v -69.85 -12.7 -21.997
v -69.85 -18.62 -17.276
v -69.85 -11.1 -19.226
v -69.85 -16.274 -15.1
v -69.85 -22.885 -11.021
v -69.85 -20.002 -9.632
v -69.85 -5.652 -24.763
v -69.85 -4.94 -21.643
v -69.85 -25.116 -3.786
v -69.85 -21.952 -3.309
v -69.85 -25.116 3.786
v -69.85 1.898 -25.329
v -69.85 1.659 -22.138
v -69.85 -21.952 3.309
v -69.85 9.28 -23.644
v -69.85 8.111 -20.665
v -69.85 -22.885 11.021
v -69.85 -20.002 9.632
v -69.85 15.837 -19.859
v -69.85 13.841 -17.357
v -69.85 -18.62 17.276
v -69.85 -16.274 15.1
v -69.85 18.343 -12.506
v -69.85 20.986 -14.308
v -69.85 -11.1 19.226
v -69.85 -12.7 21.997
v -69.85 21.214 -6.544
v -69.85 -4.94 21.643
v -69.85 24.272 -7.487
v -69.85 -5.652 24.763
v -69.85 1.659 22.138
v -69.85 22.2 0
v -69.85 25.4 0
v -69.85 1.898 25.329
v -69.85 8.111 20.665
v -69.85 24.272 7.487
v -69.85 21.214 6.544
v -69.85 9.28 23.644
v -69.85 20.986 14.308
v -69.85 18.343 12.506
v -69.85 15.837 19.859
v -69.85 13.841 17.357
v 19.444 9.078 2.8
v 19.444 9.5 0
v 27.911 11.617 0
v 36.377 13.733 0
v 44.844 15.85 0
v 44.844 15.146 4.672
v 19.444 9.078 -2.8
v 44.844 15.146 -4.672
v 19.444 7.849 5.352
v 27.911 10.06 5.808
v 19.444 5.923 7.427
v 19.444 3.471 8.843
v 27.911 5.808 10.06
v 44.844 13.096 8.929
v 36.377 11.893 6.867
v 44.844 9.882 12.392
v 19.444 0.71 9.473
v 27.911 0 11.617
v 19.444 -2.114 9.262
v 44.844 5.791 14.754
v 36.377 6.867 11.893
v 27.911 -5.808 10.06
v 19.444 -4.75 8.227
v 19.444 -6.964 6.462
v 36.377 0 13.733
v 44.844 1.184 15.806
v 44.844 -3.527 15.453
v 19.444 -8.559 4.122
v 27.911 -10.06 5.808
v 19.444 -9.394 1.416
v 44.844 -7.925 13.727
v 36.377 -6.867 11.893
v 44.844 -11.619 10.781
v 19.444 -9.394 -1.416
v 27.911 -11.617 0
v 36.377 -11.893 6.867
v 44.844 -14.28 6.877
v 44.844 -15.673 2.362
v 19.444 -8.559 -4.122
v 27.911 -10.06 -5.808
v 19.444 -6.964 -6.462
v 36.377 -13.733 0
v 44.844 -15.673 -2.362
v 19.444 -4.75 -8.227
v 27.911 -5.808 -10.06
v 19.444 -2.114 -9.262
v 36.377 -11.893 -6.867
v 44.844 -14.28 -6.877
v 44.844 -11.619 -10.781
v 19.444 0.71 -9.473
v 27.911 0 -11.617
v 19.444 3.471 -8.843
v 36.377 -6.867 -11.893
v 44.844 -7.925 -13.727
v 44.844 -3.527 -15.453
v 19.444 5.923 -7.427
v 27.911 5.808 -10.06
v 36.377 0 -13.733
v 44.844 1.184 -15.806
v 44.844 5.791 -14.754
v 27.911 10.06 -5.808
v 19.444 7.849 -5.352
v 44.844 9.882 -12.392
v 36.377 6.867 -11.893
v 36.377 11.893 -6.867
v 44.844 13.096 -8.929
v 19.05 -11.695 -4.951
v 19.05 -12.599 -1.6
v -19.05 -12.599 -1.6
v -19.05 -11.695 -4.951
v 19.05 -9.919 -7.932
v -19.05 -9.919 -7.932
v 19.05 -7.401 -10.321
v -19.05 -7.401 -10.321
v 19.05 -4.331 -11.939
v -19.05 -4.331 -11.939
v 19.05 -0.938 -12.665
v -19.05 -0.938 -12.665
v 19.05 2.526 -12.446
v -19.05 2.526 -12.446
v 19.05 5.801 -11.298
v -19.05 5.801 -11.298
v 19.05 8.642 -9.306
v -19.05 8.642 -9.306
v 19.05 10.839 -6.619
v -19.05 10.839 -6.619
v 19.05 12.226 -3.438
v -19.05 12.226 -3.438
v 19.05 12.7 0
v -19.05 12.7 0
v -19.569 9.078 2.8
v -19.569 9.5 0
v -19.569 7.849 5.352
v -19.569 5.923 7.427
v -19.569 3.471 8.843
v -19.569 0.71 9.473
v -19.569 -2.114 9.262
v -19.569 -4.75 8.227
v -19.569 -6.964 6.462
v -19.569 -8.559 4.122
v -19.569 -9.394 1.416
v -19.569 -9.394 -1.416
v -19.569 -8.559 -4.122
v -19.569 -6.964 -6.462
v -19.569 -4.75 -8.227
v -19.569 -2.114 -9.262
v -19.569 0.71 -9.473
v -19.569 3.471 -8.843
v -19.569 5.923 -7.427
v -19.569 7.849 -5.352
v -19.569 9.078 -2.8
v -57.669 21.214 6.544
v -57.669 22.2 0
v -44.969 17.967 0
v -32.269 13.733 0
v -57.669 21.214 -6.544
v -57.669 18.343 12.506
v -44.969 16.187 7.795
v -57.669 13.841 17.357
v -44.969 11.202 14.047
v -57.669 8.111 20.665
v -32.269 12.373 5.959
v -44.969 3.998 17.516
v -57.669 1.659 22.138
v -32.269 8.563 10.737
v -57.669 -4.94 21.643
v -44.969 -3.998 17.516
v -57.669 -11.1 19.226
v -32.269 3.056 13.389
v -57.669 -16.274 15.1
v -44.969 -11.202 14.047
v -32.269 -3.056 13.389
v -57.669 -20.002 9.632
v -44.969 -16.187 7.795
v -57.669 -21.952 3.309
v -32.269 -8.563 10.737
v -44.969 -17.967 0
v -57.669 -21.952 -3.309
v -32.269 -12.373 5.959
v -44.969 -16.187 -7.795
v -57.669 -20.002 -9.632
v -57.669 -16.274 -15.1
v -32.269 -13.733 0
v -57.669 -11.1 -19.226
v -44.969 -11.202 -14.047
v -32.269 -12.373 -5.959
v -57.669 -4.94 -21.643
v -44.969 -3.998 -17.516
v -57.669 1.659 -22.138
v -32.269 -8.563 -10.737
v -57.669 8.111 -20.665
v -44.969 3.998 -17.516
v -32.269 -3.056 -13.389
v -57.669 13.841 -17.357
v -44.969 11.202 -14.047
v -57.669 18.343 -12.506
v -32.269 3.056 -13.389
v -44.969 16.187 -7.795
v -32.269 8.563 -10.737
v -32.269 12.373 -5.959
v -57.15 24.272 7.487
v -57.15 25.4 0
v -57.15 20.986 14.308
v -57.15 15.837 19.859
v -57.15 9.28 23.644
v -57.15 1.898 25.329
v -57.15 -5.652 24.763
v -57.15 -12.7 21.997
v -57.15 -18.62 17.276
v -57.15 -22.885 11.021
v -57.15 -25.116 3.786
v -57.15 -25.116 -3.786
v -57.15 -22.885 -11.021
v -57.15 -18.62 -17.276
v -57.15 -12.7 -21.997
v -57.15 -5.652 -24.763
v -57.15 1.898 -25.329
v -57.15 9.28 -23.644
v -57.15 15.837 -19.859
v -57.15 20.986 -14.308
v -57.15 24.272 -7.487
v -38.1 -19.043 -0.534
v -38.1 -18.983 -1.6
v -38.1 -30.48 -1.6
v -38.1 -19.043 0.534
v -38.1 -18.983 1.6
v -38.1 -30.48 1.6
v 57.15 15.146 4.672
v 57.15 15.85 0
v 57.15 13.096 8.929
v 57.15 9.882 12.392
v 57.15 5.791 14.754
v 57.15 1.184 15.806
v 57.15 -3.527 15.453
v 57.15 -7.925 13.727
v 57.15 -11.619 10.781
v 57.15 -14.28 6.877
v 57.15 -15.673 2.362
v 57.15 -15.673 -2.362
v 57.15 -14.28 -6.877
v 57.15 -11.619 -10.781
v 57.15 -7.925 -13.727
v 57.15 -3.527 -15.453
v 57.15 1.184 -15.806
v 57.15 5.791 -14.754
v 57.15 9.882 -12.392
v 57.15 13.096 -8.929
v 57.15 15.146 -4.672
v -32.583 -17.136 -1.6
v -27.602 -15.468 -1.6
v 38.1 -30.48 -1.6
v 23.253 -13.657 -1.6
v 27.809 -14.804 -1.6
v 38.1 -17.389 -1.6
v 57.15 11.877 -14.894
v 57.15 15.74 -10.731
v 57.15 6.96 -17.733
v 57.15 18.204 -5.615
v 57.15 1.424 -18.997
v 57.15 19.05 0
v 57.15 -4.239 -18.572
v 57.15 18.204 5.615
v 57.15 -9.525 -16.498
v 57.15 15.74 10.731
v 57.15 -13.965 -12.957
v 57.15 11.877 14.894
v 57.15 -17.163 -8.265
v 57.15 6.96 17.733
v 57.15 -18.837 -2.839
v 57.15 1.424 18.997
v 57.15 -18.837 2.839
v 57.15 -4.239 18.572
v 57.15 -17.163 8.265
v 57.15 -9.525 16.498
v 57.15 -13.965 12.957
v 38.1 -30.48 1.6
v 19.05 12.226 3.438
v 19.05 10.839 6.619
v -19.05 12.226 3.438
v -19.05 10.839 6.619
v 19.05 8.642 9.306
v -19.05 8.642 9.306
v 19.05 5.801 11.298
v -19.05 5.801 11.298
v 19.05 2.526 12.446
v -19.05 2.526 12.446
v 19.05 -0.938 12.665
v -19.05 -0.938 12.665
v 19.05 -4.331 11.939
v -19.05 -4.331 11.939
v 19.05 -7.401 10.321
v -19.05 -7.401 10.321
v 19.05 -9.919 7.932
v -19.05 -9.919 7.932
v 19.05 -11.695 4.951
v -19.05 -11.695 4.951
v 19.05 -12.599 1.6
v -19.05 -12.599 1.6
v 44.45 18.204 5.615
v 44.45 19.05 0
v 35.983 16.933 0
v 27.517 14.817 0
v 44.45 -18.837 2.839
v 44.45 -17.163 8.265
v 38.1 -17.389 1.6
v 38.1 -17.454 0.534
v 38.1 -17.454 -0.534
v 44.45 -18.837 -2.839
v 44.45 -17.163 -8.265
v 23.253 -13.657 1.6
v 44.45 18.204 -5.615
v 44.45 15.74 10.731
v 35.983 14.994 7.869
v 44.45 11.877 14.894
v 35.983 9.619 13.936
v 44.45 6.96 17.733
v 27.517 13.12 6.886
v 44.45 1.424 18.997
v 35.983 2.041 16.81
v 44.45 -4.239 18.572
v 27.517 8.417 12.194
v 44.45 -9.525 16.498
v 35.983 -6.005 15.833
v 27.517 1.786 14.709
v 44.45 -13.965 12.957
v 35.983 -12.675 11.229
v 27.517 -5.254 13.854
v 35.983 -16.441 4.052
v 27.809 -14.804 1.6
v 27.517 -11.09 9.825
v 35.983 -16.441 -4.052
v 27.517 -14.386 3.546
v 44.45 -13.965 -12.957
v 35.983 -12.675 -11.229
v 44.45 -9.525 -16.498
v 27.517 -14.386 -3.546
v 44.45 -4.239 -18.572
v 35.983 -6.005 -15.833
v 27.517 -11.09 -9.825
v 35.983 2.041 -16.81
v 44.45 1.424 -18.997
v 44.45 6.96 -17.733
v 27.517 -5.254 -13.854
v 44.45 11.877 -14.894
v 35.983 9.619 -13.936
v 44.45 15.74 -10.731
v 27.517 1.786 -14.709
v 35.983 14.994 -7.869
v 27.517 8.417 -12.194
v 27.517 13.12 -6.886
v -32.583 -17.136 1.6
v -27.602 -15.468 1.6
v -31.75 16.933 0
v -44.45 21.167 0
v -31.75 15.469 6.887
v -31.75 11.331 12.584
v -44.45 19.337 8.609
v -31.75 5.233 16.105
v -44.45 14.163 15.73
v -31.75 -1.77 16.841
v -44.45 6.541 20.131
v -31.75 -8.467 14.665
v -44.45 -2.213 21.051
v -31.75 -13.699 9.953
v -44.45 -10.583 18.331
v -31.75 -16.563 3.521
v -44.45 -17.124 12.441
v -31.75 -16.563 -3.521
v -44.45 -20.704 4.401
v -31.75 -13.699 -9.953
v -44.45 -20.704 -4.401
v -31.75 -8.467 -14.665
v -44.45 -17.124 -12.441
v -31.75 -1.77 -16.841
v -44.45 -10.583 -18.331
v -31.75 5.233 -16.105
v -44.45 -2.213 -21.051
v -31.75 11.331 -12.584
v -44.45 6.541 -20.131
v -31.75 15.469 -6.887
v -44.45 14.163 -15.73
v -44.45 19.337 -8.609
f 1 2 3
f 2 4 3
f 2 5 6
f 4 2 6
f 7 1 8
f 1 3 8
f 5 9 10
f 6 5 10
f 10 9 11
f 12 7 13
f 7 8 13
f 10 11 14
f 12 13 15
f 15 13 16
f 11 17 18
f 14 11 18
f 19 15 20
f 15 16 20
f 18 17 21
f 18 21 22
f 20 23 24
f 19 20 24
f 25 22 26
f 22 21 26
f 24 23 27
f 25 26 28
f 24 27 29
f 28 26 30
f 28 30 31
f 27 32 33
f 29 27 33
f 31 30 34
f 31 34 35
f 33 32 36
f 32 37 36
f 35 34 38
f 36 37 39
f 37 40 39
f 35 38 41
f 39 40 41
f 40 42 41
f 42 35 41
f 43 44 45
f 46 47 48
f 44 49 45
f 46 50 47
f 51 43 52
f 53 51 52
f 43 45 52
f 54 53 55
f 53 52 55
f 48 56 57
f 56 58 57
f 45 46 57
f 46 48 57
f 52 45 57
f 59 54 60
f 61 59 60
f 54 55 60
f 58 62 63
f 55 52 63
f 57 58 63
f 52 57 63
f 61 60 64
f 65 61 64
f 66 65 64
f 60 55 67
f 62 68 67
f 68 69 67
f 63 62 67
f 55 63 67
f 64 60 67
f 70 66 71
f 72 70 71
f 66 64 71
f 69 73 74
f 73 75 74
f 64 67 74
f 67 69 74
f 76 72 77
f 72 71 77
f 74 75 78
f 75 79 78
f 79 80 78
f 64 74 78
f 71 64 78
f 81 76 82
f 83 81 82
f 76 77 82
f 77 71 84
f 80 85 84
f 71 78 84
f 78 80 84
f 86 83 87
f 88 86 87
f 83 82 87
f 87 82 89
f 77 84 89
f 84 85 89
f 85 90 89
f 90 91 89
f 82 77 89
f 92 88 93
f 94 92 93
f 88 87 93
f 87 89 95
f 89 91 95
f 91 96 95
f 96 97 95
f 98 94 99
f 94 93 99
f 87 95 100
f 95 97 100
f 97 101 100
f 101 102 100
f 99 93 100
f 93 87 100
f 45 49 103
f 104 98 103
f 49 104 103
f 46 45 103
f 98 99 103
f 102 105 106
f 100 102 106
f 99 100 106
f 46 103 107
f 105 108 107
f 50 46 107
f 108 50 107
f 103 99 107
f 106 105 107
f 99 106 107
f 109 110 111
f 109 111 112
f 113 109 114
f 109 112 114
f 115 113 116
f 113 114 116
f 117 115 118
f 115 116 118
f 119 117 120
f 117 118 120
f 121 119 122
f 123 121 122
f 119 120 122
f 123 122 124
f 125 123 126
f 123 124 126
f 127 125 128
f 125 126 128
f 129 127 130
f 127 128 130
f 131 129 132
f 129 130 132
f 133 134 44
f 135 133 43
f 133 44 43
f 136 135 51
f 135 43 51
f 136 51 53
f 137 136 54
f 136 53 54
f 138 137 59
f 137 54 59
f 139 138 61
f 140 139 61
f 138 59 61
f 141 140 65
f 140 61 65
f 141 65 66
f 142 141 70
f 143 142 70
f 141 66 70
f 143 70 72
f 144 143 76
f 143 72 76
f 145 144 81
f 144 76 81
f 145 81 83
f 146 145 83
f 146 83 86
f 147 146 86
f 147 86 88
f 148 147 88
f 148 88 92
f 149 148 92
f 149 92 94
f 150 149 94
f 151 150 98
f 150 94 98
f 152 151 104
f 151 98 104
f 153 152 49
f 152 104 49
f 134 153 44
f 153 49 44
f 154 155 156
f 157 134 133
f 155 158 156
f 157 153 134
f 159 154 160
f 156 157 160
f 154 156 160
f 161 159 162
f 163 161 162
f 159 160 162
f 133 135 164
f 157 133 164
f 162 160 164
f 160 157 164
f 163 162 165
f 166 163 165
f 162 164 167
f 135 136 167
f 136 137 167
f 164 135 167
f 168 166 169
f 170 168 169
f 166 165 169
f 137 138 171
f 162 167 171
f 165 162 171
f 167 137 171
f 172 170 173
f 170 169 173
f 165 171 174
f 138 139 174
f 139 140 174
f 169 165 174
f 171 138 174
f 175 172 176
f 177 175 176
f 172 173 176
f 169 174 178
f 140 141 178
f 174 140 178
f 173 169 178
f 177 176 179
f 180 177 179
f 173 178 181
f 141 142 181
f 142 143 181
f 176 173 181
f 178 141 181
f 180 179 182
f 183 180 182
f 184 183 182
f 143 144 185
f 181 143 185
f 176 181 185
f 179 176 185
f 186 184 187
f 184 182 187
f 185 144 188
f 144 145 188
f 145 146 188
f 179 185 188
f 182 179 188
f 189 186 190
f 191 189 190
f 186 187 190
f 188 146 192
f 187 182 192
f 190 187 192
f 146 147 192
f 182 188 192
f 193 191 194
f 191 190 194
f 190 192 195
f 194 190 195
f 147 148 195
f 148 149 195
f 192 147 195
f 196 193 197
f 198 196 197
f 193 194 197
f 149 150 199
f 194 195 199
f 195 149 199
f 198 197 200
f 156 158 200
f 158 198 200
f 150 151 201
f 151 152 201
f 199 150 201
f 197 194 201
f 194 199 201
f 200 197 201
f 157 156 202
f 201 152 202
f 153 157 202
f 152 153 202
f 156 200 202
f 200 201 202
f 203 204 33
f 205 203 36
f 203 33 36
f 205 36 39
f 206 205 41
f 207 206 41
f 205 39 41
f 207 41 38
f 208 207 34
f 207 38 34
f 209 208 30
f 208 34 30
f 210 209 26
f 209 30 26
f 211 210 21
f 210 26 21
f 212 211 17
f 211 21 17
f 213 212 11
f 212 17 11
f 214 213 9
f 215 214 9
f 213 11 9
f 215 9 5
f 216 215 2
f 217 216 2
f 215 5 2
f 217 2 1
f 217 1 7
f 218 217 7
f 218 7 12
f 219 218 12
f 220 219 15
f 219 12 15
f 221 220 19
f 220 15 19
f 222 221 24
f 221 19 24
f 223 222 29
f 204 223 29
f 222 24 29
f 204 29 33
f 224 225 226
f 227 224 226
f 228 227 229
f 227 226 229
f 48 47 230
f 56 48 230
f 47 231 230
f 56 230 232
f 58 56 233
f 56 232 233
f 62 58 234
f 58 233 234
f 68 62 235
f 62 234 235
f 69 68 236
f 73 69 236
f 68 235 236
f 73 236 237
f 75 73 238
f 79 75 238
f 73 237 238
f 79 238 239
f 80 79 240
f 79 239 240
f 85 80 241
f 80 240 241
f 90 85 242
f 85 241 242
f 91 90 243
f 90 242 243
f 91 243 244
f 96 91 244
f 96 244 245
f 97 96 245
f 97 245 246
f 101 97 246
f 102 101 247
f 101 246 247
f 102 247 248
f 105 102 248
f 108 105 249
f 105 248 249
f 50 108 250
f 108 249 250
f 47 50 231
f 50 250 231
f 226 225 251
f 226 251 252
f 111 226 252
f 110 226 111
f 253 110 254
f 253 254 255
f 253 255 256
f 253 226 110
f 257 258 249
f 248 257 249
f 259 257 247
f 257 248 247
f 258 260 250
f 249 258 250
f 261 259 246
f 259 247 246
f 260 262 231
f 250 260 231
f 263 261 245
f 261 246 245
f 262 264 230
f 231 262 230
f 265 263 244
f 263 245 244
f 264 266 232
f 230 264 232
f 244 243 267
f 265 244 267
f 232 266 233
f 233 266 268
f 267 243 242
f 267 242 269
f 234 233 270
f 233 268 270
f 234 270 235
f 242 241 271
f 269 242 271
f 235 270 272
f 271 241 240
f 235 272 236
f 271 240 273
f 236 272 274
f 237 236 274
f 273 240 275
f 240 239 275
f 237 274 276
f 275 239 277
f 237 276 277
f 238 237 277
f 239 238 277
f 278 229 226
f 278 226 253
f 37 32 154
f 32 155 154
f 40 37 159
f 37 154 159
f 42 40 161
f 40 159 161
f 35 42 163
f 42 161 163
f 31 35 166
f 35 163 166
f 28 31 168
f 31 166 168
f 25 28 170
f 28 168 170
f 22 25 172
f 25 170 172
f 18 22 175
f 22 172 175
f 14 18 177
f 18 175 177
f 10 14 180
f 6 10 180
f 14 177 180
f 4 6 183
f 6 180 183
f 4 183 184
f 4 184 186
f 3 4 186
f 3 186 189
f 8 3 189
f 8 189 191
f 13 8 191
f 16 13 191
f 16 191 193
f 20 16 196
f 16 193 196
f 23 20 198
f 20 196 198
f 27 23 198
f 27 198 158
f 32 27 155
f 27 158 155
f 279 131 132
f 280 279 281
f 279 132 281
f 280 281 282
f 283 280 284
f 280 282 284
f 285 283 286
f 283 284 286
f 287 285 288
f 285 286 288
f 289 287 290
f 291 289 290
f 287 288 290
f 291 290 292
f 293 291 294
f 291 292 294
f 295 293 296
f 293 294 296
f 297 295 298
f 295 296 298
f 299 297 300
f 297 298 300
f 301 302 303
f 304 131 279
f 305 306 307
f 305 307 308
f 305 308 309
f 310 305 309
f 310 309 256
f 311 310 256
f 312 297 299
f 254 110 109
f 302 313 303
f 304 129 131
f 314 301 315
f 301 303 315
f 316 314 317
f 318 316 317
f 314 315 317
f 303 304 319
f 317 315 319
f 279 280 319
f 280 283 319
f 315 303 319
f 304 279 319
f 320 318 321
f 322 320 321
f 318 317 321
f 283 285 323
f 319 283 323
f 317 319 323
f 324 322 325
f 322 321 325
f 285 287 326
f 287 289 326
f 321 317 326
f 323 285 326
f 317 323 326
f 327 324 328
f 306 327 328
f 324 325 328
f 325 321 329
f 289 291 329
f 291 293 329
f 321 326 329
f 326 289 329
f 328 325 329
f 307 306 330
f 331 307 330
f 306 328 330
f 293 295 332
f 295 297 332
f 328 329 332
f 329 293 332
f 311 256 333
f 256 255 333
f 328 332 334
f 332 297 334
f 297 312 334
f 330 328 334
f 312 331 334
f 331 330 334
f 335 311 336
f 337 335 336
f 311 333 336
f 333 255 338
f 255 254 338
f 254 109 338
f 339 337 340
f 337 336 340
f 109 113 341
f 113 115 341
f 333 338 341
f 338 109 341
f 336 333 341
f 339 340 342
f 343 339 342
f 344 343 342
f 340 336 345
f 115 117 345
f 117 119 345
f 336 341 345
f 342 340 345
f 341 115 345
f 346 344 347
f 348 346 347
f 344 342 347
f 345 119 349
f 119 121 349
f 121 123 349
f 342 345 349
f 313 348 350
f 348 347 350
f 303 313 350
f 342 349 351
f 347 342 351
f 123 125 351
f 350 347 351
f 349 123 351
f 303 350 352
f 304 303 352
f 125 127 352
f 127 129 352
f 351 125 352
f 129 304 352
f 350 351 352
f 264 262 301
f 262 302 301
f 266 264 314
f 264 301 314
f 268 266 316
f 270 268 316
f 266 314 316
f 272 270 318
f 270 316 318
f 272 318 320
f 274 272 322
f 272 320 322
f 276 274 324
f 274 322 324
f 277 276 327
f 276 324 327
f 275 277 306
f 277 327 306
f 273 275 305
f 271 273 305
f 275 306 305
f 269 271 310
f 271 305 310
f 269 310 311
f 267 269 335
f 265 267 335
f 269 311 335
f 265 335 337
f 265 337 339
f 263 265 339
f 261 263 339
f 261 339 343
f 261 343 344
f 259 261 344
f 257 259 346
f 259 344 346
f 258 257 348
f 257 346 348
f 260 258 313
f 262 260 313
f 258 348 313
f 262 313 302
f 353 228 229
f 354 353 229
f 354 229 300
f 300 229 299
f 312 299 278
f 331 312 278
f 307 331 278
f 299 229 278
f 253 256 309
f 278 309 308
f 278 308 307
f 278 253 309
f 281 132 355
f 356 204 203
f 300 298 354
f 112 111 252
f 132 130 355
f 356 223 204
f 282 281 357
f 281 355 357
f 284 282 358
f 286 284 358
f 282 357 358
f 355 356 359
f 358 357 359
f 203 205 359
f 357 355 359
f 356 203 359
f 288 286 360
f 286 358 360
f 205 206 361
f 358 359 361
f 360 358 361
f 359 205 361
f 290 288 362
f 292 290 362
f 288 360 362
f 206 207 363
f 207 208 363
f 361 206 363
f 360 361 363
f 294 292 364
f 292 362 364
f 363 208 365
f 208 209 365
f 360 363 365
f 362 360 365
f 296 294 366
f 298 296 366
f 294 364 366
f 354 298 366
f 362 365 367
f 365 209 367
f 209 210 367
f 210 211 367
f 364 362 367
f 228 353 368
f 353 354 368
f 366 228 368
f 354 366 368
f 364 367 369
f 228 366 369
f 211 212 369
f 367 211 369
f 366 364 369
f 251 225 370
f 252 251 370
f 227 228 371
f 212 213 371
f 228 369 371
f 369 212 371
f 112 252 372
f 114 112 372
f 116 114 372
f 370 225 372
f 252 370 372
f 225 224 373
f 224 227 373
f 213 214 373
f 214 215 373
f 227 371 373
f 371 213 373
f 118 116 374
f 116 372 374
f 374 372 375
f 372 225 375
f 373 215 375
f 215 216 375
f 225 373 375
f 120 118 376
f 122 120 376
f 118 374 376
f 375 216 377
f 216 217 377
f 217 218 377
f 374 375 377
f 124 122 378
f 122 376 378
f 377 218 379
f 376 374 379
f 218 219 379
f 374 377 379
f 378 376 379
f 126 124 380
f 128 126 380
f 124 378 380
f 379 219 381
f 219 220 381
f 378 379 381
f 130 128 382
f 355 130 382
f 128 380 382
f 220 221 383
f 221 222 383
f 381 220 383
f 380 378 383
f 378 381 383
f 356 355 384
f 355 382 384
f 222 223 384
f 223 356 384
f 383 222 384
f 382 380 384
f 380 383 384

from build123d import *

# Parameters (mm, degrees)
F3_W = 76.2
F3_H = 3.2


with BuildPart() as f1:
    # F0 (on Top) → F1 (revolve)
    with BuildSketch(Plane.XY):
        Polygon((44.843938002, 15.85), (57.15, 15.85), (57.15, 19.05), (44.45, 19.05), (19.05, 12.7), (-19.05, 12.7), (-57.15, 25.4), (-69.85, 25.4), (-69.85, 22.2), (-57.6692885125, 22.2), (-19.5692885125, 9.5), (19.443938002, 9.5), align=None)
    revolve(axis=Axis((-6.35, 0, 0), (1, 0, 0)))

    # F3 (on offset) → F4 (join, up to the next surface of F1)
    with BuildSketch(Plane.XZ.offset(30.48)):
        Rectangle(F3_W, F3_H)
    extrude(until=Until.NEXT, dir=(0, 1, 0))


solid = f1.part
